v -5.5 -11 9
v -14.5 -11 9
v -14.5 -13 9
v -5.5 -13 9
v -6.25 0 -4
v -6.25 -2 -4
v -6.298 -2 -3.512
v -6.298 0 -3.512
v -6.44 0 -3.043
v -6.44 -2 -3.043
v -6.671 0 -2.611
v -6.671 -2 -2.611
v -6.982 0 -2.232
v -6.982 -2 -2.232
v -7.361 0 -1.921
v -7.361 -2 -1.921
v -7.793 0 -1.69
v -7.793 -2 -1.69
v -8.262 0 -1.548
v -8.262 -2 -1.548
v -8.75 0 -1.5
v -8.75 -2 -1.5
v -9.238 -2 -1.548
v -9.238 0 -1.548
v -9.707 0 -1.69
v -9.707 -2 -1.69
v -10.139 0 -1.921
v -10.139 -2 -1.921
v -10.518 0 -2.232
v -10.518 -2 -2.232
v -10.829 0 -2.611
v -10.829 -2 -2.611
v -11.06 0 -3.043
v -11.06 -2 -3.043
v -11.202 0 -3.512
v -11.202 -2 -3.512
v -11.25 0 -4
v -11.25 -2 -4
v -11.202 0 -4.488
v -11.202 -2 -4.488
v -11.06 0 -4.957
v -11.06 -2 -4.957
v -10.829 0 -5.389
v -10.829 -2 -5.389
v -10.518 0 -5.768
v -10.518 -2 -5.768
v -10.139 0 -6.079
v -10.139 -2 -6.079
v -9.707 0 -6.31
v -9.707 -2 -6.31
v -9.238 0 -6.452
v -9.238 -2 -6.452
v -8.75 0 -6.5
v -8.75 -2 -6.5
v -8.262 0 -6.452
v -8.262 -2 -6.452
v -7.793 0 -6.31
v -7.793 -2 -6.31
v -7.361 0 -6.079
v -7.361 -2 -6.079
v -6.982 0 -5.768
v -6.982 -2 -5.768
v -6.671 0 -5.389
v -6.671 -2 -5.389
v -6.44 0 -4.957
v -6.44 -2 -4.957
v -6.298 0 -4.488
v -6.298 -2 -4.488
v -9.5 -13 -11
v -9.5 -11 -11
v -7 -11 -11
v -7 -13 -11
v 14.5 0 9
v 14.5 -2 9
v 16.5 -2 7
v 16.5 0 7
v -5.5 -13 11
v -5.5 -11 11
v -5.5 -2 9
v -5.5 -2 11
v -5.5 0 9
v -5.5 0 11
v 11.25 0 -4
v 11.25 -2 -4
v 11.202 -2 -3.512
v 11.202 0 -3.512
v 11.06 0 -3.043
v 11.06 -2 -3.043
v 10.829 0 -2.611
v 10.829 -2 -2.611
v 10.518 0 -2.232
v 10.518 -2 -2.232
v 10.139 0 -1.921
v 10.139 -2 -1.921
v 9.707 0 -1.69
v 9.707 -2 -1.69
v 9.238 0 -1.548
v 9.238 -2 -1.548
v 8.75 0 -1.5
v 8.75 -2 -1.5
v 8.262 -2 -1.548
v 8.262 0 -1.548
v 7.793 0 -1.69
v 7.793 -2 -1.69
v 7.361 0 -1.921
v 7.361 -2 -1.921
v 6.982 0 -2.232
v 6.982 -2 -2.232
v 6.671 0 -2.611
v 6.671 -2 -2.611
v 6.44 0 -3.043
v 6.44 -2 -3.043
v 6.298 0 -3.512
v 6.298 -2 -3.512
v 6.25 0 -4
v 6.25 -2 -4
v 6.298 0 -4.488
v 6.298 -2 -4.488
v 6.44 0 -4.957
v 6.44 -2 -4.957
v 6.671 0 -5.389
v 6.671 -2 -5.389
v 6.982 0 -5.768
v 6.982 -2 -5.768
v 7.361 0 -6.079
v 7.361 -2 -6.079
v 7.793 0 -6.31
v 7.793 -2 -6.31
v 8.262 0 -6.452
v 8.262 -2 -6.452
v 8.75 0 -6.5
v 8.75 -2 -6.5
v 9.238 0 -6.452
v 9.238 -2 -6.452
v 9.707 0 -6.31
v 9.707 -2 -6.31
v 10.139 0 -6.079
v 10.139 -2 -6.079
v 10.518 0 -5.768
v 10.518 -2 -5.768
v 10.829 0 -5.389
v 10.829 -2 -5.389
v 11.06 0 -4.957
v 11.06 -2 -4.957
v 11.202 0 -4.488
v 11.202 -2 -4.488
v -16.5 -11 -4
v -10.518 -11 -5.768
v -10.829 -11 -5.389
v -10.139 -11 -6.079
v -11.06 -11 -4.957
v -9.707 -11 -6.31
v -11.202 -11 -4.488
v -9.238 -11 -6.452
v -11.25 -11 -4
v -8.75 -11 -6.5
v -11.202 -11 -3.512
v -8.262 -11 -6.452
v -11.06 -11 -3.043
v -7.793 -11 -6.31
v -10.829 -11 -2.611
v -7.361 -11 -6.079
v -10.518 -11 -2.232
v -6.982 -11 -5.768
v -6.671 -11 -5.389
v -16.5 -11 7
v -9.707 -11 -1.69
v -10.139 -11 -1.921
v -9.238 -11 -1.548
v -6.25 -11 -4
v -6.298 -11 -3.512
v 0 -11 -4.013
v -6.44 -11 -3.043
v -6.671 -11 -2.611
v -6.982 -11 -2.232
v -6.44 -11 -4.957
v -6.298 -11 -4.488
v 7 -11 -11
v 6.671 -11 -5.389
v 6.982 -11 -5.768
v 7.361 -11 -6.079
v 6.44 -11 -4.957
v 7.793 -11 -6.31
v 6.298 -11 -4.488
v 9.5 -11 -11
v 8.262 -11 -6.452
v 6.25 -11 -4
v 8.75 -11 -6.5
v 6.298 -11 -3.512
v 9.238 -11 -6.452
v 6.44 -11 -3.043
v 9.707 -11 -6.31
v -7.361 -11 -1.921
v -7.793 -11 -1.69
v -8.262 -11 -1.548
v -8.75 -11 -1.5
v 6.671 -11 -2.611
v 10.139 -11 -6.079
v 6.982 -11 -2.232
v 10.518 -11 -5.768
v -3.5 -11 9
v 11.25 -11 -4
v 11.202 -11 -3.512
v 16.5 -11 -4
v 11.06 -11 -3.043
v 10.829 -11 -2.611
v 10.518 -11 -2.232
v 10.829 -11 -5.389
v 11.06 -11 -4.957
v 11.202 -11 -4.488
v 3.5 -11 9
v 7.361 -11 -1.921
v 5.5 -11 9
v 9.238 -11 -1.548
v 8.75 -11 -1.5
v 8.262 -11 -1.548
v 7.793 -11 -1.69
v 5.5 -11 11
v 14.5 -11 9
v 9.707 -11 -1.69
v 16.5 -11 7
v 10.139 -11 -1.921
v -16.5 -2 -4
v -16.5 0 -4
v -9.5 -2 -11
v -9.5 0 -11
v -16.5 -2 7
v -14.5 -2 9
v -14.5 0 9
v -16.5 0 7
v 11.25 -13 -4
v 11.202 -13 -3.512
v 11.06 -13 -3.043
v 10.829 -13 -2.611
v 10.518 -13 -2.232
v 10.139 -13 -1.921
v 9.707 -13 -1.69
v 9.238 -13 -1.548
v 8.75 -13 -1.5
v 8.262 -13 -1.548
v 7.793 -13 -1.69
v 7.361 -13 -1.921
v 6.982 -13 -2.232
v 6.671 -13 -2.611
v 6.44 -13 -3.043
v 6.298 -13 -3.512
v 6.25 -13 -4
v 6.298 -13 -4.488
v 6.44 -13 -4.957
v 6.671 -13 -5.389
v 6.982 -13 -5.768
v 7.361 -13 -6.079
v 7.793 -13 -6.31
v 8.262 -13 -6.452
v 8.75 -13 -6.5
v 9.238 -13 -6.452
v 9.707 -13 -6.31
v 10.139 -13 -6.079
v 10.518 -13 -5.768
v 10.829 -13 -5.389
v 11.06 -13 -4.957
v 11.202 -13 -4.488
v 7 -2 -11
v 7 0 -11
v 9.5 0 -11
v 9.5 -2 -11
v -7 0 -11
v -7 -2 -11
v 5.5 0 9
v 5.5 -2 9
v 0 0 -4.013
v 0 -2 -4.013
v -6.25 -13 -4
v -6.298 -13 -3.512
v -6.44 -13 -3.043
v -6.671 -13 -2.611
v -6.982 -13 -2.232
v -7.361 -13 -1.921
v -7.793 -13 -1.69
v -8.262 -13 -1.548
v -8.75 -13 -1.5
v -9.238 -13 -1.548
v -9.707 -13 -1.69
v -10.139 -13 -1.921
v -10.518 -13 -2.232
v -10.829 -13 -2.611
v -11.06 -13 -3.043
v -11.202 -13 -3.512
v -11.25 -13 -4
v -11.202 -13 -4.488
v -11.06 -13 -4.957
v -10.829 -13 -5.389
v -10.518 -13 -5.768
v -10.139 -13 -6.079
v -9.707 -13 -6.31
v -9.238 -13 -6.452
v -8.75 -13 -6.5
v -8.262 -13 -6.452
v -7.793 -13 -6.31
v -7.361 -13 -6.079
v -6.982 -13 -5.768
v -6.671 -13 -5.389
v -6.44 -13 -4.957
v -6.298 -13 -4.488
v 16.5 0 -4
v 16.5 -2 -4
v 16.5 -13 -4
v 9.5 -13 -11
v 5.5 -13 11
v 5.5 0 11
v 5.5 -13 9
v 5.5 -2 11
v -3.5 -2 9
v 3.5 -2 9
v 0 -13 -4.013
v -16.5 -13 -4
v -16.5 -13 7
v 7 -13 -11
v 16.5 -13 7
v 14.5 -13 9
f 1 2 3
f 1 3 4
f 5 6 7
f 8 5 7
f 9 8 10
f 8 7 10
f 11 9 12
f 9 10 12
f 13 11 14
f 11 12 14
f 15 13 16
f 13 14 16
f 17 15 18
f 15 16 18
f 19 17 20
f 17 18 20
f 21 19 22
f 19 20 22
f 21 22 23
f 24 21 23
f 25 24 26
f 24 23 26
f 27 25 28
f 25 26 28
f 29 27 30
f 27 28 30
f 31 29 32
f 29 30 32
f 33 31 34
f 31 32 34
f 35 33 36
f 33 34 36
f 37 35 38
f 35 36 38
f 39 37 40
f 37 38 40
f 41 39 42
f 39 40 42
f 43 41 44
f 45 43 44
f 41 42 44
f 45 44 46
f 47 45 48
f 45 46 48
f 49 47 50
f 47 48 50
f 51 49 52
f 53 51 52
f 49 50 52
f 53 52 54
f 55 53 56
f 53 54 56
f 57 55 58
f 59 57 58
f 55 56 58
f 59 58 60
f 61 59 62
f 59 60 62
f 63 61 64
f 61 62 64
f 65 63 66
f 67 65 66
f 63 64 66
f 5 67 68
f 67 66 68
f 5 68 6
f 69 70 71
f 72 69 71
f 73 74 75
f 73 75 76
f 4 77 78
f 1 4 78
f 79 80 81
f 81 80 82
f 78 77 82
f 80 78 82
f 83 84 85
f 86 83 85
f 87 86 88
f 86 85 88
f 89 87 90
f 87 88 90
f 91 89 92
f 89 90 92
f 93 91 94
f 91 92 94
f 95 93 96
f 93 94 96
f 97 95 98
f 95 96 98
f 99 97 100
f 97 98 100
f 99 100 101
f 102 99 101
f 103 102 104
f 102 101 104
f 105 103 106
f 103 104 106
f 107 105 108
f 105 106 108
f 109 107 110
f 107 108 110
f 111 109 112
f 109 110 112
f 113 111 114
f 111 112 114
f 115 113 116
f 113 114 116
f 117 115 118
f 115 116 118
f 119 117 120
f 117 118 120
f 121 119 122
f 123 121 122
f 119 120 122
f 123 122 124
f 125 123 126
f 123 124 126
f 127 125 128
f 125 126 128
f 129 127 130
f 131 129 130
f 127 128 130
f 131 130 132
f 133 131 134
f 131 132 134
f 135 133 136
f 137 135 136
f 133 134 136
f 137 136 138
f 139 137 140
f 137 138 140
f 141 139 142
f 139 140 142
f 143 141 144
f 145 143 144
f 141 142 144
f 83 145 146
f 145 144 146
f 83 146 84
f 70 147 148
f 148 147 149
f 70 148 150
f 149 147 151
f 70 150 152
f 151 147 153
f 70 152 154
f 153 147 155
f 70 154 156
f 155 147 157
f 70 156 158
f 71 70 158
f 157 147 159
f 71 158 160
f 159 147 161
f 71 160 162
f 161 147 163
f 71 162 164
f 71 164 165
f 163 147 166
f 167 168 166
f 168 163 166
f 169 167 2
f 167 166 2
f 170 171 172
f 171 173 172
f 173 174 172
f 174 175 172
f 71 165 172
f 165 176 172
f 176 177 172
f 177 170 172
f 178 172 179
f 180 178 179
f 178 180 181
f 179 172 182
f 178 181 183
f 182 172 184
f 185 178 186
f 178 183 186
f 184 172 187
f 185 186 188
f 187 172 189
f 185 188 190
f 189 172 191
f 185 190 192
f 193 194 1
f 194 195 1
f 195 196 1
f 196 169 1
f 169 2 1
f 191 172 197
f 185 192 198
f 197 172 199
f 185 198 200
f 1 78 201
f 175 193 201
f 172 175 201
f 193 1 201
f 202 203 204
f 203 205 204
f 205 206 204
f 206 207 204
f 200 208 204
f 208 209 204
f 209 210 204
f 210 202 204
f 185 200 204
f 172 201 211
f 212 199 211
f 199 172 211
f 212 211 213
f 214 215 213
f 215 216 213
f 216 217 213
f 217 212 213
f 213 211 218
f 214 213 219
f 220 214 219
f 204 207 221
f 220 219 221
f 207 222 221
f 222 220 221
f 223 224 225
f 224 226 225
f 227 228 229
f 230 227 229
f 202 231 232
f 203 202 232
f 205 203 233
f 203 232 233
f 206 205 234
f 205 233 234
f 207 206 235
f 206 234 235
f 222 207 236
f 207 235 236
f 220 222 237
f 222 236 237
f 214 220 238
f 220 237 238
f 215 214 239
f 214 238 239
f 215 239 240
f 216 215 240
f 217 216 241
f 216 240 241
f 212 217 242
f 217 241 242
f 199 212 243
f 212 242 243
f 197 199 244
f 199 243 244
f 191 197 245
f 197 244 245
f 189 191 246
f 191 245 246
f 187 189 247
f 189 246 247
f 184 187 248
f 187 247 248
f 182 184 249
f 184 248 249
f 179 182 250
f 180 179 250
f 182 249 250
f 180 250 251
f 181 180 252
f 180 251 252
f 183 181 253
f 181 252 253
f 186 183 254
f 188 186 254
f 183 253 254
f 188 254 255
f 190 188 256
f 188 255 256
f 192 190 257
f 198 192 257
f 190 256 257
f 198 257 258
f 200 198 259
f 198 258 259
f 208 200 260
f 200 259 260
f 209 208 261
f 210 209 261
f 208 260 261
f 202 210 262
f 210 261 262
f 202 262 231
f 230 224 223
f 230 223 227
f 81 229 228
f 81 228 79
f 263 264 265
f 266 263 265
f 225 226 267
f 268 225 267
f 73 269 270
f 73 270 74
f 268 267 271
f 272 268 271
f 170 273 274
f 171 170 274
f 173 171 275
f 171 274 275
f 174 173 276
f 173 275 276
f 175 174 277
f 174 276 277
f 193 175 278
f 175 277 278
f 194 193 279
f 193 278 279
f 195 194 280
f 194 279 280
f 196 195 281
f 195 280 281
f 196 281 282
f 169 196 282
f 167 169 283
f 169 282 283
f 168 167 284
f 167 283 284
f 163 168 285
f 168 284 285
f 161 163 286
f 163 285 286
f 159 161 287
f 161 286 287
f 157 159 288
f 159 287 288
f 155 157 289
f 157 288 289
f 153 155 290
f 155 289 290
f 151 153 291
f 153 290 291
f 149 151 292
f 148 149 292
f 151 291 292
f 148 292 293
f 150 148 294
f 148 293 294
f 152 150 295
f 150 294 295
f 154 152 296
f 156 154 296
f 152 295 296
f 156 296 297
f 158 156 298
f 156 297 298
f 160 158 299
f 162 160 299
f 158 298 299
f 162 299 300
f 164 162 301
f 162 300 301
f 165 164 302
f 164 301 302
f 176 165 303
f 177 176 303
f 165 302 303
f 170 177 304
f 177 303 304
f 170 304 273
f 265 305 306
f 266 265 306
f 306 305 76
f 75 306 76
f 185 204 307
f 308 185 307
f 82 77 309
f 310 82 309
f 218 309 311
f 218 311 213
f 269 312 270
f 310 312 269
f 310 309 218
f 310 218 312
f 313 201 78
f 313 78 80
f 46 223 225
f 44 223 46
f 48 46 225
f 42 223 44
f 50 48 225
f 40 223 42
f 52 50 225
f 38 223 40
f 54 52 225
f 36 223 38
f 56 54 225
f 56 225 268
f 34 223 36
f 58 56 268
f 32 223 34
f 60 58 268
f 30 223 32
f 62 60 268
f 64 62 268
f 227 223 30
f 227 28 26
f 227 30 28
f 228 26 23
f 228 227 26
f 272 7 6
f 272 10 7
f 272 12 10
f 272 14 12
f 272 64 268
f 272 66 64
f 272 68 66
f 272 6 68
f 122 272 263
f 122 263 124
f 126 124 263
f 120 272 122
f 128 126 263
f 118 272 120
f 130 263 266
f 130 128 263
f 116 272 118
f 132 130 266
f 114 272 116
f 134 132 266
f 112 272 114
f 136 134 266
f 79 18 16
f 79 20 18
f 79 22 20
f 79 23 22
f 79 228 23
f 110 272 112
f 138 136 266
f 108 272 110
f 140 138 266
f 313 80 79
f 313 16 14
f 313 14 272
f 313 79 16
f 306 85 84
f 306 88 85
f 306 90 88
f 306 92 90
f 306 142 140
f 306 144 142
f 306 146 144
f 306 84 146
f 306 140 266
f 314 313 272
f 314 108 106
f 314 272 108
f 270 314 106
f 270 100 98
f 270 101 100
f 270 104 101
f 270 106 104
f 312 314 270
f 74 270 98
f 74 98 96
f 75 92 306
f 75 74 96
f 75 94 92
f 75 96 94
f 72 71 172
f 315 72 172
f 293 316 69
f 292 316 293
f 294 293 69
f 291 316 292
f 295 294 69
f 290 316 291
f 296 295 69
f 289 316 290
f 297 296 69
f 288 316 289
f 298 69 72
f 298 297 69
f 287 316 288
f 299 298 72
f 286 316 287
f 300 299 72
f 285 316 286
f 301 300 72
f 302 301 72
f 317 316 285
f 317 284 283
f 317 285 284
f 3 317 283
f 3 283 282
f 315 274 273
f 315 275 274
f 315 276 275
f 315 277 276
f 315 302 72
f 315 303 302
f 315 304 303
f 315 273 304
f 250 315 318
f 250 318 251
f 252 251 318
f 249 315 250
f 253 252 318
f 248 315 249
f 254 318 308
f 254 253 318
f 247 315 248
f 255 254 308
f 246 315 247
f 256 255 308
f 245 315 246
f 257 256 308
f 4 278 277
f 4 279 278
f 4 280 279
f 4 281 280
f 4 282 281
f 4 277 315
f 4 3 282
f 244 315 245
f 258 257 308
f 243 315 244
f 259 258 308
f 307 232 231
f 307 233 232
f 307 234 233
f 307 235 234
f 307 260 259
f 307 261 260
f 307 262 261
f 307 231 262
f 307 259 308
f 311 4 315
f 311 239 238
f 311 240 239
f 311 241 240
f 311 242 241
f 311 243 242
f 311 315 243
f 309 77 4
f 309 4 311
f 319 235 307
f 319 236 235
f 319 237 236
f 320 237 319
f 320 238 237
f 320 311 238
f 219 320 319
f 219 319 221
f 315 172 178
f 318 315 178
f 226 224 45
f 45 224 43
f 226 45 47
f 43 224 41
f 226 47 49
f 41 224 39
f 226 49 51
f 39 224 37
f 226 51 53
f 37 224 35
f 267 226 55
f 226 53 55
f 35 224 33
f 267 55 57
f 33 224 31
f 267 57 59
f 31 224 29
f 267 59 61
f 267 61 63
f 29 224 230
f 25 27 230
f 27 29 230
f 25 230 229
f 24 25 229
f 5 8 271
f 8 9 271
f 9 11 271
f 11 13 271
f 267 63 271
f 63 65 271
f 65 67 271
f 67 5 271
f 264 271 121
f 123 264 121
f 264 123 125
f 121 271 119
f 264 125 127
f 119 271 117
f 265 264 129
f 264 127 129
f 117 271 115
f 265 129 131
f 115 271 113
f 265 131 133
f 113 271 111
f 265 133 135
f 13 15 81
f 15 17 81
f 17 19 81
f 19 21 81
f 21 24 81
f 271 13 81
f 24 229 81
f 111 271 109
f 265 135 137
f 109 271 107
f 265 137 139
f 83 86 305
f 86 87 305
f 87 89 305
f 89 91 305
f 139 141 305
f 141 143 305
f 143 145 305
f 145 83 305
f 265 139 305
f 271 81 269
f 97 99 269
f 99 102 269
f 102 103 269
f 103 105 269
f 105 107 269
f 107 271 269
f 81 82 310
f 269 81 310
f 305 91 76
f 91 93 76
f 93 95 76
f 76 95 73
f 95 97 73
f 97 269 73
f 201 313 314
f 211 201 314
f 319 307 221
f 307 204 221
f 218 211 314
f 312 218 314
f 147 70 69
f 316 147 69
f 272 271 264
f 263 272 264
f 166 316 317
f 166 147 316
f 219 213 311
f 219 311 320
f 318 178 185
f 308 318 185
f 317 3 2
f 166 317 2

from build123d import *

# Parameters (mm, degrees)
F0_W      = 33
F0_H      = 22
F2_DEPTH  = 13
F3_SIZE   = 7
F4_R      = 2.5
F5_DEPTH  = 25
F6_T      = -2
F7_W      = 11
F7_H      = 13
F8_DEPTH  = 2
F9_SIZE   = 1.99999
F11_DEPTH = 25
F12_SIZE  = 2


# Not quite as in the source:
# - a fillet or chamfer is up to 0.001 mm smaller than in the source, because OpenCascade refuses the exact size


with BuildPart() as f2:
    # F0 (on Front) → F2 (new body)
    with BuildSketch(Plane.XZ):
        Rectangle(F0_W, F0_H)
    extrude(amount=F2_DEPTH)

    # F3
    f3_edges = [f2.edges().sort_by_distance(p)[0] for p in [
        (-16.5, -6.5, -11),
        (16.5, -6.5, -11),
    ]]
    chamfer(f3_edges, length=F3_SIZE)

    # F4 (on face) → F5 (cut)
    with BuildSketch(Plane.XZ.offset(13)):
        with Locations((-8.75, -4)):
            Circle(F4_R)
        with Locations((8.75, -4)):
            Circle(F4_R)
    extrude(amount=-F5_DEPTH, mode=Mode.SUBTRACT)

    # F6
    f6_openings = [f2.faces().sort_by_distance(p)[0] for p in [
        (0, -6.5, -11),
        (13, -6.5, -7.5),
        (16.5, -6.5, 3.5),
        (-16.5, -6.5, 3.5),
        (-13, -6.5, -7.5),
        (-11.25, -6.5, -4),
        (6.25, -6.5, -4),
    ]]
    offset(amount=F6_T, openings=f6_openings)

    # F7 (on face) → F8 (cut)
    with BuildSketch(Plane.XY.offset(11)):
        with Locations((11, -6.5)):
            Rectangle(F7_W, F7_H)
        with Locations((-11, -6.5)):
            Rectangle(F7_W, F7_H)
    extrude(amount=-F8_DEPTH, mode=Mode.SUBTRACT)

    # F9 (size 2 in the source; OpenCascade refuses exactly that, so slightly less here)
    f9_edges = [f2.edges().sort_by_distance(p)[0] for p in [
        (5.5, -6.5, 9),
        (-5.5, -6.5, 9),
    ]]
    chamfer(f9_edges, length=F9_SIZE)

    # F10 (on face) → F11 (cut)
    with BuildSketch(Plane(origin=(0, 0, 0), x_dir=(-1, 0, 0), z_dir=(0, 1, 0))):
        Polygon((7, -11), (0, -4.0134343201), (-7, -11), align=None)
    extrude(amount=-F11_DEPTH, mode=Mode.SUBTRACT)

    # F12
    f12_edges = [f2.edges().sort_by_distance(p)[0] for p in [
        (16.5, -12, 9),
        (16.5, -1, 9),
        (-16.5, -12, 9),
        (-16.5, -1, 9),
    ]]
    chamfer(f12_edges, length=F12_SIZE)


solid = f2.part
